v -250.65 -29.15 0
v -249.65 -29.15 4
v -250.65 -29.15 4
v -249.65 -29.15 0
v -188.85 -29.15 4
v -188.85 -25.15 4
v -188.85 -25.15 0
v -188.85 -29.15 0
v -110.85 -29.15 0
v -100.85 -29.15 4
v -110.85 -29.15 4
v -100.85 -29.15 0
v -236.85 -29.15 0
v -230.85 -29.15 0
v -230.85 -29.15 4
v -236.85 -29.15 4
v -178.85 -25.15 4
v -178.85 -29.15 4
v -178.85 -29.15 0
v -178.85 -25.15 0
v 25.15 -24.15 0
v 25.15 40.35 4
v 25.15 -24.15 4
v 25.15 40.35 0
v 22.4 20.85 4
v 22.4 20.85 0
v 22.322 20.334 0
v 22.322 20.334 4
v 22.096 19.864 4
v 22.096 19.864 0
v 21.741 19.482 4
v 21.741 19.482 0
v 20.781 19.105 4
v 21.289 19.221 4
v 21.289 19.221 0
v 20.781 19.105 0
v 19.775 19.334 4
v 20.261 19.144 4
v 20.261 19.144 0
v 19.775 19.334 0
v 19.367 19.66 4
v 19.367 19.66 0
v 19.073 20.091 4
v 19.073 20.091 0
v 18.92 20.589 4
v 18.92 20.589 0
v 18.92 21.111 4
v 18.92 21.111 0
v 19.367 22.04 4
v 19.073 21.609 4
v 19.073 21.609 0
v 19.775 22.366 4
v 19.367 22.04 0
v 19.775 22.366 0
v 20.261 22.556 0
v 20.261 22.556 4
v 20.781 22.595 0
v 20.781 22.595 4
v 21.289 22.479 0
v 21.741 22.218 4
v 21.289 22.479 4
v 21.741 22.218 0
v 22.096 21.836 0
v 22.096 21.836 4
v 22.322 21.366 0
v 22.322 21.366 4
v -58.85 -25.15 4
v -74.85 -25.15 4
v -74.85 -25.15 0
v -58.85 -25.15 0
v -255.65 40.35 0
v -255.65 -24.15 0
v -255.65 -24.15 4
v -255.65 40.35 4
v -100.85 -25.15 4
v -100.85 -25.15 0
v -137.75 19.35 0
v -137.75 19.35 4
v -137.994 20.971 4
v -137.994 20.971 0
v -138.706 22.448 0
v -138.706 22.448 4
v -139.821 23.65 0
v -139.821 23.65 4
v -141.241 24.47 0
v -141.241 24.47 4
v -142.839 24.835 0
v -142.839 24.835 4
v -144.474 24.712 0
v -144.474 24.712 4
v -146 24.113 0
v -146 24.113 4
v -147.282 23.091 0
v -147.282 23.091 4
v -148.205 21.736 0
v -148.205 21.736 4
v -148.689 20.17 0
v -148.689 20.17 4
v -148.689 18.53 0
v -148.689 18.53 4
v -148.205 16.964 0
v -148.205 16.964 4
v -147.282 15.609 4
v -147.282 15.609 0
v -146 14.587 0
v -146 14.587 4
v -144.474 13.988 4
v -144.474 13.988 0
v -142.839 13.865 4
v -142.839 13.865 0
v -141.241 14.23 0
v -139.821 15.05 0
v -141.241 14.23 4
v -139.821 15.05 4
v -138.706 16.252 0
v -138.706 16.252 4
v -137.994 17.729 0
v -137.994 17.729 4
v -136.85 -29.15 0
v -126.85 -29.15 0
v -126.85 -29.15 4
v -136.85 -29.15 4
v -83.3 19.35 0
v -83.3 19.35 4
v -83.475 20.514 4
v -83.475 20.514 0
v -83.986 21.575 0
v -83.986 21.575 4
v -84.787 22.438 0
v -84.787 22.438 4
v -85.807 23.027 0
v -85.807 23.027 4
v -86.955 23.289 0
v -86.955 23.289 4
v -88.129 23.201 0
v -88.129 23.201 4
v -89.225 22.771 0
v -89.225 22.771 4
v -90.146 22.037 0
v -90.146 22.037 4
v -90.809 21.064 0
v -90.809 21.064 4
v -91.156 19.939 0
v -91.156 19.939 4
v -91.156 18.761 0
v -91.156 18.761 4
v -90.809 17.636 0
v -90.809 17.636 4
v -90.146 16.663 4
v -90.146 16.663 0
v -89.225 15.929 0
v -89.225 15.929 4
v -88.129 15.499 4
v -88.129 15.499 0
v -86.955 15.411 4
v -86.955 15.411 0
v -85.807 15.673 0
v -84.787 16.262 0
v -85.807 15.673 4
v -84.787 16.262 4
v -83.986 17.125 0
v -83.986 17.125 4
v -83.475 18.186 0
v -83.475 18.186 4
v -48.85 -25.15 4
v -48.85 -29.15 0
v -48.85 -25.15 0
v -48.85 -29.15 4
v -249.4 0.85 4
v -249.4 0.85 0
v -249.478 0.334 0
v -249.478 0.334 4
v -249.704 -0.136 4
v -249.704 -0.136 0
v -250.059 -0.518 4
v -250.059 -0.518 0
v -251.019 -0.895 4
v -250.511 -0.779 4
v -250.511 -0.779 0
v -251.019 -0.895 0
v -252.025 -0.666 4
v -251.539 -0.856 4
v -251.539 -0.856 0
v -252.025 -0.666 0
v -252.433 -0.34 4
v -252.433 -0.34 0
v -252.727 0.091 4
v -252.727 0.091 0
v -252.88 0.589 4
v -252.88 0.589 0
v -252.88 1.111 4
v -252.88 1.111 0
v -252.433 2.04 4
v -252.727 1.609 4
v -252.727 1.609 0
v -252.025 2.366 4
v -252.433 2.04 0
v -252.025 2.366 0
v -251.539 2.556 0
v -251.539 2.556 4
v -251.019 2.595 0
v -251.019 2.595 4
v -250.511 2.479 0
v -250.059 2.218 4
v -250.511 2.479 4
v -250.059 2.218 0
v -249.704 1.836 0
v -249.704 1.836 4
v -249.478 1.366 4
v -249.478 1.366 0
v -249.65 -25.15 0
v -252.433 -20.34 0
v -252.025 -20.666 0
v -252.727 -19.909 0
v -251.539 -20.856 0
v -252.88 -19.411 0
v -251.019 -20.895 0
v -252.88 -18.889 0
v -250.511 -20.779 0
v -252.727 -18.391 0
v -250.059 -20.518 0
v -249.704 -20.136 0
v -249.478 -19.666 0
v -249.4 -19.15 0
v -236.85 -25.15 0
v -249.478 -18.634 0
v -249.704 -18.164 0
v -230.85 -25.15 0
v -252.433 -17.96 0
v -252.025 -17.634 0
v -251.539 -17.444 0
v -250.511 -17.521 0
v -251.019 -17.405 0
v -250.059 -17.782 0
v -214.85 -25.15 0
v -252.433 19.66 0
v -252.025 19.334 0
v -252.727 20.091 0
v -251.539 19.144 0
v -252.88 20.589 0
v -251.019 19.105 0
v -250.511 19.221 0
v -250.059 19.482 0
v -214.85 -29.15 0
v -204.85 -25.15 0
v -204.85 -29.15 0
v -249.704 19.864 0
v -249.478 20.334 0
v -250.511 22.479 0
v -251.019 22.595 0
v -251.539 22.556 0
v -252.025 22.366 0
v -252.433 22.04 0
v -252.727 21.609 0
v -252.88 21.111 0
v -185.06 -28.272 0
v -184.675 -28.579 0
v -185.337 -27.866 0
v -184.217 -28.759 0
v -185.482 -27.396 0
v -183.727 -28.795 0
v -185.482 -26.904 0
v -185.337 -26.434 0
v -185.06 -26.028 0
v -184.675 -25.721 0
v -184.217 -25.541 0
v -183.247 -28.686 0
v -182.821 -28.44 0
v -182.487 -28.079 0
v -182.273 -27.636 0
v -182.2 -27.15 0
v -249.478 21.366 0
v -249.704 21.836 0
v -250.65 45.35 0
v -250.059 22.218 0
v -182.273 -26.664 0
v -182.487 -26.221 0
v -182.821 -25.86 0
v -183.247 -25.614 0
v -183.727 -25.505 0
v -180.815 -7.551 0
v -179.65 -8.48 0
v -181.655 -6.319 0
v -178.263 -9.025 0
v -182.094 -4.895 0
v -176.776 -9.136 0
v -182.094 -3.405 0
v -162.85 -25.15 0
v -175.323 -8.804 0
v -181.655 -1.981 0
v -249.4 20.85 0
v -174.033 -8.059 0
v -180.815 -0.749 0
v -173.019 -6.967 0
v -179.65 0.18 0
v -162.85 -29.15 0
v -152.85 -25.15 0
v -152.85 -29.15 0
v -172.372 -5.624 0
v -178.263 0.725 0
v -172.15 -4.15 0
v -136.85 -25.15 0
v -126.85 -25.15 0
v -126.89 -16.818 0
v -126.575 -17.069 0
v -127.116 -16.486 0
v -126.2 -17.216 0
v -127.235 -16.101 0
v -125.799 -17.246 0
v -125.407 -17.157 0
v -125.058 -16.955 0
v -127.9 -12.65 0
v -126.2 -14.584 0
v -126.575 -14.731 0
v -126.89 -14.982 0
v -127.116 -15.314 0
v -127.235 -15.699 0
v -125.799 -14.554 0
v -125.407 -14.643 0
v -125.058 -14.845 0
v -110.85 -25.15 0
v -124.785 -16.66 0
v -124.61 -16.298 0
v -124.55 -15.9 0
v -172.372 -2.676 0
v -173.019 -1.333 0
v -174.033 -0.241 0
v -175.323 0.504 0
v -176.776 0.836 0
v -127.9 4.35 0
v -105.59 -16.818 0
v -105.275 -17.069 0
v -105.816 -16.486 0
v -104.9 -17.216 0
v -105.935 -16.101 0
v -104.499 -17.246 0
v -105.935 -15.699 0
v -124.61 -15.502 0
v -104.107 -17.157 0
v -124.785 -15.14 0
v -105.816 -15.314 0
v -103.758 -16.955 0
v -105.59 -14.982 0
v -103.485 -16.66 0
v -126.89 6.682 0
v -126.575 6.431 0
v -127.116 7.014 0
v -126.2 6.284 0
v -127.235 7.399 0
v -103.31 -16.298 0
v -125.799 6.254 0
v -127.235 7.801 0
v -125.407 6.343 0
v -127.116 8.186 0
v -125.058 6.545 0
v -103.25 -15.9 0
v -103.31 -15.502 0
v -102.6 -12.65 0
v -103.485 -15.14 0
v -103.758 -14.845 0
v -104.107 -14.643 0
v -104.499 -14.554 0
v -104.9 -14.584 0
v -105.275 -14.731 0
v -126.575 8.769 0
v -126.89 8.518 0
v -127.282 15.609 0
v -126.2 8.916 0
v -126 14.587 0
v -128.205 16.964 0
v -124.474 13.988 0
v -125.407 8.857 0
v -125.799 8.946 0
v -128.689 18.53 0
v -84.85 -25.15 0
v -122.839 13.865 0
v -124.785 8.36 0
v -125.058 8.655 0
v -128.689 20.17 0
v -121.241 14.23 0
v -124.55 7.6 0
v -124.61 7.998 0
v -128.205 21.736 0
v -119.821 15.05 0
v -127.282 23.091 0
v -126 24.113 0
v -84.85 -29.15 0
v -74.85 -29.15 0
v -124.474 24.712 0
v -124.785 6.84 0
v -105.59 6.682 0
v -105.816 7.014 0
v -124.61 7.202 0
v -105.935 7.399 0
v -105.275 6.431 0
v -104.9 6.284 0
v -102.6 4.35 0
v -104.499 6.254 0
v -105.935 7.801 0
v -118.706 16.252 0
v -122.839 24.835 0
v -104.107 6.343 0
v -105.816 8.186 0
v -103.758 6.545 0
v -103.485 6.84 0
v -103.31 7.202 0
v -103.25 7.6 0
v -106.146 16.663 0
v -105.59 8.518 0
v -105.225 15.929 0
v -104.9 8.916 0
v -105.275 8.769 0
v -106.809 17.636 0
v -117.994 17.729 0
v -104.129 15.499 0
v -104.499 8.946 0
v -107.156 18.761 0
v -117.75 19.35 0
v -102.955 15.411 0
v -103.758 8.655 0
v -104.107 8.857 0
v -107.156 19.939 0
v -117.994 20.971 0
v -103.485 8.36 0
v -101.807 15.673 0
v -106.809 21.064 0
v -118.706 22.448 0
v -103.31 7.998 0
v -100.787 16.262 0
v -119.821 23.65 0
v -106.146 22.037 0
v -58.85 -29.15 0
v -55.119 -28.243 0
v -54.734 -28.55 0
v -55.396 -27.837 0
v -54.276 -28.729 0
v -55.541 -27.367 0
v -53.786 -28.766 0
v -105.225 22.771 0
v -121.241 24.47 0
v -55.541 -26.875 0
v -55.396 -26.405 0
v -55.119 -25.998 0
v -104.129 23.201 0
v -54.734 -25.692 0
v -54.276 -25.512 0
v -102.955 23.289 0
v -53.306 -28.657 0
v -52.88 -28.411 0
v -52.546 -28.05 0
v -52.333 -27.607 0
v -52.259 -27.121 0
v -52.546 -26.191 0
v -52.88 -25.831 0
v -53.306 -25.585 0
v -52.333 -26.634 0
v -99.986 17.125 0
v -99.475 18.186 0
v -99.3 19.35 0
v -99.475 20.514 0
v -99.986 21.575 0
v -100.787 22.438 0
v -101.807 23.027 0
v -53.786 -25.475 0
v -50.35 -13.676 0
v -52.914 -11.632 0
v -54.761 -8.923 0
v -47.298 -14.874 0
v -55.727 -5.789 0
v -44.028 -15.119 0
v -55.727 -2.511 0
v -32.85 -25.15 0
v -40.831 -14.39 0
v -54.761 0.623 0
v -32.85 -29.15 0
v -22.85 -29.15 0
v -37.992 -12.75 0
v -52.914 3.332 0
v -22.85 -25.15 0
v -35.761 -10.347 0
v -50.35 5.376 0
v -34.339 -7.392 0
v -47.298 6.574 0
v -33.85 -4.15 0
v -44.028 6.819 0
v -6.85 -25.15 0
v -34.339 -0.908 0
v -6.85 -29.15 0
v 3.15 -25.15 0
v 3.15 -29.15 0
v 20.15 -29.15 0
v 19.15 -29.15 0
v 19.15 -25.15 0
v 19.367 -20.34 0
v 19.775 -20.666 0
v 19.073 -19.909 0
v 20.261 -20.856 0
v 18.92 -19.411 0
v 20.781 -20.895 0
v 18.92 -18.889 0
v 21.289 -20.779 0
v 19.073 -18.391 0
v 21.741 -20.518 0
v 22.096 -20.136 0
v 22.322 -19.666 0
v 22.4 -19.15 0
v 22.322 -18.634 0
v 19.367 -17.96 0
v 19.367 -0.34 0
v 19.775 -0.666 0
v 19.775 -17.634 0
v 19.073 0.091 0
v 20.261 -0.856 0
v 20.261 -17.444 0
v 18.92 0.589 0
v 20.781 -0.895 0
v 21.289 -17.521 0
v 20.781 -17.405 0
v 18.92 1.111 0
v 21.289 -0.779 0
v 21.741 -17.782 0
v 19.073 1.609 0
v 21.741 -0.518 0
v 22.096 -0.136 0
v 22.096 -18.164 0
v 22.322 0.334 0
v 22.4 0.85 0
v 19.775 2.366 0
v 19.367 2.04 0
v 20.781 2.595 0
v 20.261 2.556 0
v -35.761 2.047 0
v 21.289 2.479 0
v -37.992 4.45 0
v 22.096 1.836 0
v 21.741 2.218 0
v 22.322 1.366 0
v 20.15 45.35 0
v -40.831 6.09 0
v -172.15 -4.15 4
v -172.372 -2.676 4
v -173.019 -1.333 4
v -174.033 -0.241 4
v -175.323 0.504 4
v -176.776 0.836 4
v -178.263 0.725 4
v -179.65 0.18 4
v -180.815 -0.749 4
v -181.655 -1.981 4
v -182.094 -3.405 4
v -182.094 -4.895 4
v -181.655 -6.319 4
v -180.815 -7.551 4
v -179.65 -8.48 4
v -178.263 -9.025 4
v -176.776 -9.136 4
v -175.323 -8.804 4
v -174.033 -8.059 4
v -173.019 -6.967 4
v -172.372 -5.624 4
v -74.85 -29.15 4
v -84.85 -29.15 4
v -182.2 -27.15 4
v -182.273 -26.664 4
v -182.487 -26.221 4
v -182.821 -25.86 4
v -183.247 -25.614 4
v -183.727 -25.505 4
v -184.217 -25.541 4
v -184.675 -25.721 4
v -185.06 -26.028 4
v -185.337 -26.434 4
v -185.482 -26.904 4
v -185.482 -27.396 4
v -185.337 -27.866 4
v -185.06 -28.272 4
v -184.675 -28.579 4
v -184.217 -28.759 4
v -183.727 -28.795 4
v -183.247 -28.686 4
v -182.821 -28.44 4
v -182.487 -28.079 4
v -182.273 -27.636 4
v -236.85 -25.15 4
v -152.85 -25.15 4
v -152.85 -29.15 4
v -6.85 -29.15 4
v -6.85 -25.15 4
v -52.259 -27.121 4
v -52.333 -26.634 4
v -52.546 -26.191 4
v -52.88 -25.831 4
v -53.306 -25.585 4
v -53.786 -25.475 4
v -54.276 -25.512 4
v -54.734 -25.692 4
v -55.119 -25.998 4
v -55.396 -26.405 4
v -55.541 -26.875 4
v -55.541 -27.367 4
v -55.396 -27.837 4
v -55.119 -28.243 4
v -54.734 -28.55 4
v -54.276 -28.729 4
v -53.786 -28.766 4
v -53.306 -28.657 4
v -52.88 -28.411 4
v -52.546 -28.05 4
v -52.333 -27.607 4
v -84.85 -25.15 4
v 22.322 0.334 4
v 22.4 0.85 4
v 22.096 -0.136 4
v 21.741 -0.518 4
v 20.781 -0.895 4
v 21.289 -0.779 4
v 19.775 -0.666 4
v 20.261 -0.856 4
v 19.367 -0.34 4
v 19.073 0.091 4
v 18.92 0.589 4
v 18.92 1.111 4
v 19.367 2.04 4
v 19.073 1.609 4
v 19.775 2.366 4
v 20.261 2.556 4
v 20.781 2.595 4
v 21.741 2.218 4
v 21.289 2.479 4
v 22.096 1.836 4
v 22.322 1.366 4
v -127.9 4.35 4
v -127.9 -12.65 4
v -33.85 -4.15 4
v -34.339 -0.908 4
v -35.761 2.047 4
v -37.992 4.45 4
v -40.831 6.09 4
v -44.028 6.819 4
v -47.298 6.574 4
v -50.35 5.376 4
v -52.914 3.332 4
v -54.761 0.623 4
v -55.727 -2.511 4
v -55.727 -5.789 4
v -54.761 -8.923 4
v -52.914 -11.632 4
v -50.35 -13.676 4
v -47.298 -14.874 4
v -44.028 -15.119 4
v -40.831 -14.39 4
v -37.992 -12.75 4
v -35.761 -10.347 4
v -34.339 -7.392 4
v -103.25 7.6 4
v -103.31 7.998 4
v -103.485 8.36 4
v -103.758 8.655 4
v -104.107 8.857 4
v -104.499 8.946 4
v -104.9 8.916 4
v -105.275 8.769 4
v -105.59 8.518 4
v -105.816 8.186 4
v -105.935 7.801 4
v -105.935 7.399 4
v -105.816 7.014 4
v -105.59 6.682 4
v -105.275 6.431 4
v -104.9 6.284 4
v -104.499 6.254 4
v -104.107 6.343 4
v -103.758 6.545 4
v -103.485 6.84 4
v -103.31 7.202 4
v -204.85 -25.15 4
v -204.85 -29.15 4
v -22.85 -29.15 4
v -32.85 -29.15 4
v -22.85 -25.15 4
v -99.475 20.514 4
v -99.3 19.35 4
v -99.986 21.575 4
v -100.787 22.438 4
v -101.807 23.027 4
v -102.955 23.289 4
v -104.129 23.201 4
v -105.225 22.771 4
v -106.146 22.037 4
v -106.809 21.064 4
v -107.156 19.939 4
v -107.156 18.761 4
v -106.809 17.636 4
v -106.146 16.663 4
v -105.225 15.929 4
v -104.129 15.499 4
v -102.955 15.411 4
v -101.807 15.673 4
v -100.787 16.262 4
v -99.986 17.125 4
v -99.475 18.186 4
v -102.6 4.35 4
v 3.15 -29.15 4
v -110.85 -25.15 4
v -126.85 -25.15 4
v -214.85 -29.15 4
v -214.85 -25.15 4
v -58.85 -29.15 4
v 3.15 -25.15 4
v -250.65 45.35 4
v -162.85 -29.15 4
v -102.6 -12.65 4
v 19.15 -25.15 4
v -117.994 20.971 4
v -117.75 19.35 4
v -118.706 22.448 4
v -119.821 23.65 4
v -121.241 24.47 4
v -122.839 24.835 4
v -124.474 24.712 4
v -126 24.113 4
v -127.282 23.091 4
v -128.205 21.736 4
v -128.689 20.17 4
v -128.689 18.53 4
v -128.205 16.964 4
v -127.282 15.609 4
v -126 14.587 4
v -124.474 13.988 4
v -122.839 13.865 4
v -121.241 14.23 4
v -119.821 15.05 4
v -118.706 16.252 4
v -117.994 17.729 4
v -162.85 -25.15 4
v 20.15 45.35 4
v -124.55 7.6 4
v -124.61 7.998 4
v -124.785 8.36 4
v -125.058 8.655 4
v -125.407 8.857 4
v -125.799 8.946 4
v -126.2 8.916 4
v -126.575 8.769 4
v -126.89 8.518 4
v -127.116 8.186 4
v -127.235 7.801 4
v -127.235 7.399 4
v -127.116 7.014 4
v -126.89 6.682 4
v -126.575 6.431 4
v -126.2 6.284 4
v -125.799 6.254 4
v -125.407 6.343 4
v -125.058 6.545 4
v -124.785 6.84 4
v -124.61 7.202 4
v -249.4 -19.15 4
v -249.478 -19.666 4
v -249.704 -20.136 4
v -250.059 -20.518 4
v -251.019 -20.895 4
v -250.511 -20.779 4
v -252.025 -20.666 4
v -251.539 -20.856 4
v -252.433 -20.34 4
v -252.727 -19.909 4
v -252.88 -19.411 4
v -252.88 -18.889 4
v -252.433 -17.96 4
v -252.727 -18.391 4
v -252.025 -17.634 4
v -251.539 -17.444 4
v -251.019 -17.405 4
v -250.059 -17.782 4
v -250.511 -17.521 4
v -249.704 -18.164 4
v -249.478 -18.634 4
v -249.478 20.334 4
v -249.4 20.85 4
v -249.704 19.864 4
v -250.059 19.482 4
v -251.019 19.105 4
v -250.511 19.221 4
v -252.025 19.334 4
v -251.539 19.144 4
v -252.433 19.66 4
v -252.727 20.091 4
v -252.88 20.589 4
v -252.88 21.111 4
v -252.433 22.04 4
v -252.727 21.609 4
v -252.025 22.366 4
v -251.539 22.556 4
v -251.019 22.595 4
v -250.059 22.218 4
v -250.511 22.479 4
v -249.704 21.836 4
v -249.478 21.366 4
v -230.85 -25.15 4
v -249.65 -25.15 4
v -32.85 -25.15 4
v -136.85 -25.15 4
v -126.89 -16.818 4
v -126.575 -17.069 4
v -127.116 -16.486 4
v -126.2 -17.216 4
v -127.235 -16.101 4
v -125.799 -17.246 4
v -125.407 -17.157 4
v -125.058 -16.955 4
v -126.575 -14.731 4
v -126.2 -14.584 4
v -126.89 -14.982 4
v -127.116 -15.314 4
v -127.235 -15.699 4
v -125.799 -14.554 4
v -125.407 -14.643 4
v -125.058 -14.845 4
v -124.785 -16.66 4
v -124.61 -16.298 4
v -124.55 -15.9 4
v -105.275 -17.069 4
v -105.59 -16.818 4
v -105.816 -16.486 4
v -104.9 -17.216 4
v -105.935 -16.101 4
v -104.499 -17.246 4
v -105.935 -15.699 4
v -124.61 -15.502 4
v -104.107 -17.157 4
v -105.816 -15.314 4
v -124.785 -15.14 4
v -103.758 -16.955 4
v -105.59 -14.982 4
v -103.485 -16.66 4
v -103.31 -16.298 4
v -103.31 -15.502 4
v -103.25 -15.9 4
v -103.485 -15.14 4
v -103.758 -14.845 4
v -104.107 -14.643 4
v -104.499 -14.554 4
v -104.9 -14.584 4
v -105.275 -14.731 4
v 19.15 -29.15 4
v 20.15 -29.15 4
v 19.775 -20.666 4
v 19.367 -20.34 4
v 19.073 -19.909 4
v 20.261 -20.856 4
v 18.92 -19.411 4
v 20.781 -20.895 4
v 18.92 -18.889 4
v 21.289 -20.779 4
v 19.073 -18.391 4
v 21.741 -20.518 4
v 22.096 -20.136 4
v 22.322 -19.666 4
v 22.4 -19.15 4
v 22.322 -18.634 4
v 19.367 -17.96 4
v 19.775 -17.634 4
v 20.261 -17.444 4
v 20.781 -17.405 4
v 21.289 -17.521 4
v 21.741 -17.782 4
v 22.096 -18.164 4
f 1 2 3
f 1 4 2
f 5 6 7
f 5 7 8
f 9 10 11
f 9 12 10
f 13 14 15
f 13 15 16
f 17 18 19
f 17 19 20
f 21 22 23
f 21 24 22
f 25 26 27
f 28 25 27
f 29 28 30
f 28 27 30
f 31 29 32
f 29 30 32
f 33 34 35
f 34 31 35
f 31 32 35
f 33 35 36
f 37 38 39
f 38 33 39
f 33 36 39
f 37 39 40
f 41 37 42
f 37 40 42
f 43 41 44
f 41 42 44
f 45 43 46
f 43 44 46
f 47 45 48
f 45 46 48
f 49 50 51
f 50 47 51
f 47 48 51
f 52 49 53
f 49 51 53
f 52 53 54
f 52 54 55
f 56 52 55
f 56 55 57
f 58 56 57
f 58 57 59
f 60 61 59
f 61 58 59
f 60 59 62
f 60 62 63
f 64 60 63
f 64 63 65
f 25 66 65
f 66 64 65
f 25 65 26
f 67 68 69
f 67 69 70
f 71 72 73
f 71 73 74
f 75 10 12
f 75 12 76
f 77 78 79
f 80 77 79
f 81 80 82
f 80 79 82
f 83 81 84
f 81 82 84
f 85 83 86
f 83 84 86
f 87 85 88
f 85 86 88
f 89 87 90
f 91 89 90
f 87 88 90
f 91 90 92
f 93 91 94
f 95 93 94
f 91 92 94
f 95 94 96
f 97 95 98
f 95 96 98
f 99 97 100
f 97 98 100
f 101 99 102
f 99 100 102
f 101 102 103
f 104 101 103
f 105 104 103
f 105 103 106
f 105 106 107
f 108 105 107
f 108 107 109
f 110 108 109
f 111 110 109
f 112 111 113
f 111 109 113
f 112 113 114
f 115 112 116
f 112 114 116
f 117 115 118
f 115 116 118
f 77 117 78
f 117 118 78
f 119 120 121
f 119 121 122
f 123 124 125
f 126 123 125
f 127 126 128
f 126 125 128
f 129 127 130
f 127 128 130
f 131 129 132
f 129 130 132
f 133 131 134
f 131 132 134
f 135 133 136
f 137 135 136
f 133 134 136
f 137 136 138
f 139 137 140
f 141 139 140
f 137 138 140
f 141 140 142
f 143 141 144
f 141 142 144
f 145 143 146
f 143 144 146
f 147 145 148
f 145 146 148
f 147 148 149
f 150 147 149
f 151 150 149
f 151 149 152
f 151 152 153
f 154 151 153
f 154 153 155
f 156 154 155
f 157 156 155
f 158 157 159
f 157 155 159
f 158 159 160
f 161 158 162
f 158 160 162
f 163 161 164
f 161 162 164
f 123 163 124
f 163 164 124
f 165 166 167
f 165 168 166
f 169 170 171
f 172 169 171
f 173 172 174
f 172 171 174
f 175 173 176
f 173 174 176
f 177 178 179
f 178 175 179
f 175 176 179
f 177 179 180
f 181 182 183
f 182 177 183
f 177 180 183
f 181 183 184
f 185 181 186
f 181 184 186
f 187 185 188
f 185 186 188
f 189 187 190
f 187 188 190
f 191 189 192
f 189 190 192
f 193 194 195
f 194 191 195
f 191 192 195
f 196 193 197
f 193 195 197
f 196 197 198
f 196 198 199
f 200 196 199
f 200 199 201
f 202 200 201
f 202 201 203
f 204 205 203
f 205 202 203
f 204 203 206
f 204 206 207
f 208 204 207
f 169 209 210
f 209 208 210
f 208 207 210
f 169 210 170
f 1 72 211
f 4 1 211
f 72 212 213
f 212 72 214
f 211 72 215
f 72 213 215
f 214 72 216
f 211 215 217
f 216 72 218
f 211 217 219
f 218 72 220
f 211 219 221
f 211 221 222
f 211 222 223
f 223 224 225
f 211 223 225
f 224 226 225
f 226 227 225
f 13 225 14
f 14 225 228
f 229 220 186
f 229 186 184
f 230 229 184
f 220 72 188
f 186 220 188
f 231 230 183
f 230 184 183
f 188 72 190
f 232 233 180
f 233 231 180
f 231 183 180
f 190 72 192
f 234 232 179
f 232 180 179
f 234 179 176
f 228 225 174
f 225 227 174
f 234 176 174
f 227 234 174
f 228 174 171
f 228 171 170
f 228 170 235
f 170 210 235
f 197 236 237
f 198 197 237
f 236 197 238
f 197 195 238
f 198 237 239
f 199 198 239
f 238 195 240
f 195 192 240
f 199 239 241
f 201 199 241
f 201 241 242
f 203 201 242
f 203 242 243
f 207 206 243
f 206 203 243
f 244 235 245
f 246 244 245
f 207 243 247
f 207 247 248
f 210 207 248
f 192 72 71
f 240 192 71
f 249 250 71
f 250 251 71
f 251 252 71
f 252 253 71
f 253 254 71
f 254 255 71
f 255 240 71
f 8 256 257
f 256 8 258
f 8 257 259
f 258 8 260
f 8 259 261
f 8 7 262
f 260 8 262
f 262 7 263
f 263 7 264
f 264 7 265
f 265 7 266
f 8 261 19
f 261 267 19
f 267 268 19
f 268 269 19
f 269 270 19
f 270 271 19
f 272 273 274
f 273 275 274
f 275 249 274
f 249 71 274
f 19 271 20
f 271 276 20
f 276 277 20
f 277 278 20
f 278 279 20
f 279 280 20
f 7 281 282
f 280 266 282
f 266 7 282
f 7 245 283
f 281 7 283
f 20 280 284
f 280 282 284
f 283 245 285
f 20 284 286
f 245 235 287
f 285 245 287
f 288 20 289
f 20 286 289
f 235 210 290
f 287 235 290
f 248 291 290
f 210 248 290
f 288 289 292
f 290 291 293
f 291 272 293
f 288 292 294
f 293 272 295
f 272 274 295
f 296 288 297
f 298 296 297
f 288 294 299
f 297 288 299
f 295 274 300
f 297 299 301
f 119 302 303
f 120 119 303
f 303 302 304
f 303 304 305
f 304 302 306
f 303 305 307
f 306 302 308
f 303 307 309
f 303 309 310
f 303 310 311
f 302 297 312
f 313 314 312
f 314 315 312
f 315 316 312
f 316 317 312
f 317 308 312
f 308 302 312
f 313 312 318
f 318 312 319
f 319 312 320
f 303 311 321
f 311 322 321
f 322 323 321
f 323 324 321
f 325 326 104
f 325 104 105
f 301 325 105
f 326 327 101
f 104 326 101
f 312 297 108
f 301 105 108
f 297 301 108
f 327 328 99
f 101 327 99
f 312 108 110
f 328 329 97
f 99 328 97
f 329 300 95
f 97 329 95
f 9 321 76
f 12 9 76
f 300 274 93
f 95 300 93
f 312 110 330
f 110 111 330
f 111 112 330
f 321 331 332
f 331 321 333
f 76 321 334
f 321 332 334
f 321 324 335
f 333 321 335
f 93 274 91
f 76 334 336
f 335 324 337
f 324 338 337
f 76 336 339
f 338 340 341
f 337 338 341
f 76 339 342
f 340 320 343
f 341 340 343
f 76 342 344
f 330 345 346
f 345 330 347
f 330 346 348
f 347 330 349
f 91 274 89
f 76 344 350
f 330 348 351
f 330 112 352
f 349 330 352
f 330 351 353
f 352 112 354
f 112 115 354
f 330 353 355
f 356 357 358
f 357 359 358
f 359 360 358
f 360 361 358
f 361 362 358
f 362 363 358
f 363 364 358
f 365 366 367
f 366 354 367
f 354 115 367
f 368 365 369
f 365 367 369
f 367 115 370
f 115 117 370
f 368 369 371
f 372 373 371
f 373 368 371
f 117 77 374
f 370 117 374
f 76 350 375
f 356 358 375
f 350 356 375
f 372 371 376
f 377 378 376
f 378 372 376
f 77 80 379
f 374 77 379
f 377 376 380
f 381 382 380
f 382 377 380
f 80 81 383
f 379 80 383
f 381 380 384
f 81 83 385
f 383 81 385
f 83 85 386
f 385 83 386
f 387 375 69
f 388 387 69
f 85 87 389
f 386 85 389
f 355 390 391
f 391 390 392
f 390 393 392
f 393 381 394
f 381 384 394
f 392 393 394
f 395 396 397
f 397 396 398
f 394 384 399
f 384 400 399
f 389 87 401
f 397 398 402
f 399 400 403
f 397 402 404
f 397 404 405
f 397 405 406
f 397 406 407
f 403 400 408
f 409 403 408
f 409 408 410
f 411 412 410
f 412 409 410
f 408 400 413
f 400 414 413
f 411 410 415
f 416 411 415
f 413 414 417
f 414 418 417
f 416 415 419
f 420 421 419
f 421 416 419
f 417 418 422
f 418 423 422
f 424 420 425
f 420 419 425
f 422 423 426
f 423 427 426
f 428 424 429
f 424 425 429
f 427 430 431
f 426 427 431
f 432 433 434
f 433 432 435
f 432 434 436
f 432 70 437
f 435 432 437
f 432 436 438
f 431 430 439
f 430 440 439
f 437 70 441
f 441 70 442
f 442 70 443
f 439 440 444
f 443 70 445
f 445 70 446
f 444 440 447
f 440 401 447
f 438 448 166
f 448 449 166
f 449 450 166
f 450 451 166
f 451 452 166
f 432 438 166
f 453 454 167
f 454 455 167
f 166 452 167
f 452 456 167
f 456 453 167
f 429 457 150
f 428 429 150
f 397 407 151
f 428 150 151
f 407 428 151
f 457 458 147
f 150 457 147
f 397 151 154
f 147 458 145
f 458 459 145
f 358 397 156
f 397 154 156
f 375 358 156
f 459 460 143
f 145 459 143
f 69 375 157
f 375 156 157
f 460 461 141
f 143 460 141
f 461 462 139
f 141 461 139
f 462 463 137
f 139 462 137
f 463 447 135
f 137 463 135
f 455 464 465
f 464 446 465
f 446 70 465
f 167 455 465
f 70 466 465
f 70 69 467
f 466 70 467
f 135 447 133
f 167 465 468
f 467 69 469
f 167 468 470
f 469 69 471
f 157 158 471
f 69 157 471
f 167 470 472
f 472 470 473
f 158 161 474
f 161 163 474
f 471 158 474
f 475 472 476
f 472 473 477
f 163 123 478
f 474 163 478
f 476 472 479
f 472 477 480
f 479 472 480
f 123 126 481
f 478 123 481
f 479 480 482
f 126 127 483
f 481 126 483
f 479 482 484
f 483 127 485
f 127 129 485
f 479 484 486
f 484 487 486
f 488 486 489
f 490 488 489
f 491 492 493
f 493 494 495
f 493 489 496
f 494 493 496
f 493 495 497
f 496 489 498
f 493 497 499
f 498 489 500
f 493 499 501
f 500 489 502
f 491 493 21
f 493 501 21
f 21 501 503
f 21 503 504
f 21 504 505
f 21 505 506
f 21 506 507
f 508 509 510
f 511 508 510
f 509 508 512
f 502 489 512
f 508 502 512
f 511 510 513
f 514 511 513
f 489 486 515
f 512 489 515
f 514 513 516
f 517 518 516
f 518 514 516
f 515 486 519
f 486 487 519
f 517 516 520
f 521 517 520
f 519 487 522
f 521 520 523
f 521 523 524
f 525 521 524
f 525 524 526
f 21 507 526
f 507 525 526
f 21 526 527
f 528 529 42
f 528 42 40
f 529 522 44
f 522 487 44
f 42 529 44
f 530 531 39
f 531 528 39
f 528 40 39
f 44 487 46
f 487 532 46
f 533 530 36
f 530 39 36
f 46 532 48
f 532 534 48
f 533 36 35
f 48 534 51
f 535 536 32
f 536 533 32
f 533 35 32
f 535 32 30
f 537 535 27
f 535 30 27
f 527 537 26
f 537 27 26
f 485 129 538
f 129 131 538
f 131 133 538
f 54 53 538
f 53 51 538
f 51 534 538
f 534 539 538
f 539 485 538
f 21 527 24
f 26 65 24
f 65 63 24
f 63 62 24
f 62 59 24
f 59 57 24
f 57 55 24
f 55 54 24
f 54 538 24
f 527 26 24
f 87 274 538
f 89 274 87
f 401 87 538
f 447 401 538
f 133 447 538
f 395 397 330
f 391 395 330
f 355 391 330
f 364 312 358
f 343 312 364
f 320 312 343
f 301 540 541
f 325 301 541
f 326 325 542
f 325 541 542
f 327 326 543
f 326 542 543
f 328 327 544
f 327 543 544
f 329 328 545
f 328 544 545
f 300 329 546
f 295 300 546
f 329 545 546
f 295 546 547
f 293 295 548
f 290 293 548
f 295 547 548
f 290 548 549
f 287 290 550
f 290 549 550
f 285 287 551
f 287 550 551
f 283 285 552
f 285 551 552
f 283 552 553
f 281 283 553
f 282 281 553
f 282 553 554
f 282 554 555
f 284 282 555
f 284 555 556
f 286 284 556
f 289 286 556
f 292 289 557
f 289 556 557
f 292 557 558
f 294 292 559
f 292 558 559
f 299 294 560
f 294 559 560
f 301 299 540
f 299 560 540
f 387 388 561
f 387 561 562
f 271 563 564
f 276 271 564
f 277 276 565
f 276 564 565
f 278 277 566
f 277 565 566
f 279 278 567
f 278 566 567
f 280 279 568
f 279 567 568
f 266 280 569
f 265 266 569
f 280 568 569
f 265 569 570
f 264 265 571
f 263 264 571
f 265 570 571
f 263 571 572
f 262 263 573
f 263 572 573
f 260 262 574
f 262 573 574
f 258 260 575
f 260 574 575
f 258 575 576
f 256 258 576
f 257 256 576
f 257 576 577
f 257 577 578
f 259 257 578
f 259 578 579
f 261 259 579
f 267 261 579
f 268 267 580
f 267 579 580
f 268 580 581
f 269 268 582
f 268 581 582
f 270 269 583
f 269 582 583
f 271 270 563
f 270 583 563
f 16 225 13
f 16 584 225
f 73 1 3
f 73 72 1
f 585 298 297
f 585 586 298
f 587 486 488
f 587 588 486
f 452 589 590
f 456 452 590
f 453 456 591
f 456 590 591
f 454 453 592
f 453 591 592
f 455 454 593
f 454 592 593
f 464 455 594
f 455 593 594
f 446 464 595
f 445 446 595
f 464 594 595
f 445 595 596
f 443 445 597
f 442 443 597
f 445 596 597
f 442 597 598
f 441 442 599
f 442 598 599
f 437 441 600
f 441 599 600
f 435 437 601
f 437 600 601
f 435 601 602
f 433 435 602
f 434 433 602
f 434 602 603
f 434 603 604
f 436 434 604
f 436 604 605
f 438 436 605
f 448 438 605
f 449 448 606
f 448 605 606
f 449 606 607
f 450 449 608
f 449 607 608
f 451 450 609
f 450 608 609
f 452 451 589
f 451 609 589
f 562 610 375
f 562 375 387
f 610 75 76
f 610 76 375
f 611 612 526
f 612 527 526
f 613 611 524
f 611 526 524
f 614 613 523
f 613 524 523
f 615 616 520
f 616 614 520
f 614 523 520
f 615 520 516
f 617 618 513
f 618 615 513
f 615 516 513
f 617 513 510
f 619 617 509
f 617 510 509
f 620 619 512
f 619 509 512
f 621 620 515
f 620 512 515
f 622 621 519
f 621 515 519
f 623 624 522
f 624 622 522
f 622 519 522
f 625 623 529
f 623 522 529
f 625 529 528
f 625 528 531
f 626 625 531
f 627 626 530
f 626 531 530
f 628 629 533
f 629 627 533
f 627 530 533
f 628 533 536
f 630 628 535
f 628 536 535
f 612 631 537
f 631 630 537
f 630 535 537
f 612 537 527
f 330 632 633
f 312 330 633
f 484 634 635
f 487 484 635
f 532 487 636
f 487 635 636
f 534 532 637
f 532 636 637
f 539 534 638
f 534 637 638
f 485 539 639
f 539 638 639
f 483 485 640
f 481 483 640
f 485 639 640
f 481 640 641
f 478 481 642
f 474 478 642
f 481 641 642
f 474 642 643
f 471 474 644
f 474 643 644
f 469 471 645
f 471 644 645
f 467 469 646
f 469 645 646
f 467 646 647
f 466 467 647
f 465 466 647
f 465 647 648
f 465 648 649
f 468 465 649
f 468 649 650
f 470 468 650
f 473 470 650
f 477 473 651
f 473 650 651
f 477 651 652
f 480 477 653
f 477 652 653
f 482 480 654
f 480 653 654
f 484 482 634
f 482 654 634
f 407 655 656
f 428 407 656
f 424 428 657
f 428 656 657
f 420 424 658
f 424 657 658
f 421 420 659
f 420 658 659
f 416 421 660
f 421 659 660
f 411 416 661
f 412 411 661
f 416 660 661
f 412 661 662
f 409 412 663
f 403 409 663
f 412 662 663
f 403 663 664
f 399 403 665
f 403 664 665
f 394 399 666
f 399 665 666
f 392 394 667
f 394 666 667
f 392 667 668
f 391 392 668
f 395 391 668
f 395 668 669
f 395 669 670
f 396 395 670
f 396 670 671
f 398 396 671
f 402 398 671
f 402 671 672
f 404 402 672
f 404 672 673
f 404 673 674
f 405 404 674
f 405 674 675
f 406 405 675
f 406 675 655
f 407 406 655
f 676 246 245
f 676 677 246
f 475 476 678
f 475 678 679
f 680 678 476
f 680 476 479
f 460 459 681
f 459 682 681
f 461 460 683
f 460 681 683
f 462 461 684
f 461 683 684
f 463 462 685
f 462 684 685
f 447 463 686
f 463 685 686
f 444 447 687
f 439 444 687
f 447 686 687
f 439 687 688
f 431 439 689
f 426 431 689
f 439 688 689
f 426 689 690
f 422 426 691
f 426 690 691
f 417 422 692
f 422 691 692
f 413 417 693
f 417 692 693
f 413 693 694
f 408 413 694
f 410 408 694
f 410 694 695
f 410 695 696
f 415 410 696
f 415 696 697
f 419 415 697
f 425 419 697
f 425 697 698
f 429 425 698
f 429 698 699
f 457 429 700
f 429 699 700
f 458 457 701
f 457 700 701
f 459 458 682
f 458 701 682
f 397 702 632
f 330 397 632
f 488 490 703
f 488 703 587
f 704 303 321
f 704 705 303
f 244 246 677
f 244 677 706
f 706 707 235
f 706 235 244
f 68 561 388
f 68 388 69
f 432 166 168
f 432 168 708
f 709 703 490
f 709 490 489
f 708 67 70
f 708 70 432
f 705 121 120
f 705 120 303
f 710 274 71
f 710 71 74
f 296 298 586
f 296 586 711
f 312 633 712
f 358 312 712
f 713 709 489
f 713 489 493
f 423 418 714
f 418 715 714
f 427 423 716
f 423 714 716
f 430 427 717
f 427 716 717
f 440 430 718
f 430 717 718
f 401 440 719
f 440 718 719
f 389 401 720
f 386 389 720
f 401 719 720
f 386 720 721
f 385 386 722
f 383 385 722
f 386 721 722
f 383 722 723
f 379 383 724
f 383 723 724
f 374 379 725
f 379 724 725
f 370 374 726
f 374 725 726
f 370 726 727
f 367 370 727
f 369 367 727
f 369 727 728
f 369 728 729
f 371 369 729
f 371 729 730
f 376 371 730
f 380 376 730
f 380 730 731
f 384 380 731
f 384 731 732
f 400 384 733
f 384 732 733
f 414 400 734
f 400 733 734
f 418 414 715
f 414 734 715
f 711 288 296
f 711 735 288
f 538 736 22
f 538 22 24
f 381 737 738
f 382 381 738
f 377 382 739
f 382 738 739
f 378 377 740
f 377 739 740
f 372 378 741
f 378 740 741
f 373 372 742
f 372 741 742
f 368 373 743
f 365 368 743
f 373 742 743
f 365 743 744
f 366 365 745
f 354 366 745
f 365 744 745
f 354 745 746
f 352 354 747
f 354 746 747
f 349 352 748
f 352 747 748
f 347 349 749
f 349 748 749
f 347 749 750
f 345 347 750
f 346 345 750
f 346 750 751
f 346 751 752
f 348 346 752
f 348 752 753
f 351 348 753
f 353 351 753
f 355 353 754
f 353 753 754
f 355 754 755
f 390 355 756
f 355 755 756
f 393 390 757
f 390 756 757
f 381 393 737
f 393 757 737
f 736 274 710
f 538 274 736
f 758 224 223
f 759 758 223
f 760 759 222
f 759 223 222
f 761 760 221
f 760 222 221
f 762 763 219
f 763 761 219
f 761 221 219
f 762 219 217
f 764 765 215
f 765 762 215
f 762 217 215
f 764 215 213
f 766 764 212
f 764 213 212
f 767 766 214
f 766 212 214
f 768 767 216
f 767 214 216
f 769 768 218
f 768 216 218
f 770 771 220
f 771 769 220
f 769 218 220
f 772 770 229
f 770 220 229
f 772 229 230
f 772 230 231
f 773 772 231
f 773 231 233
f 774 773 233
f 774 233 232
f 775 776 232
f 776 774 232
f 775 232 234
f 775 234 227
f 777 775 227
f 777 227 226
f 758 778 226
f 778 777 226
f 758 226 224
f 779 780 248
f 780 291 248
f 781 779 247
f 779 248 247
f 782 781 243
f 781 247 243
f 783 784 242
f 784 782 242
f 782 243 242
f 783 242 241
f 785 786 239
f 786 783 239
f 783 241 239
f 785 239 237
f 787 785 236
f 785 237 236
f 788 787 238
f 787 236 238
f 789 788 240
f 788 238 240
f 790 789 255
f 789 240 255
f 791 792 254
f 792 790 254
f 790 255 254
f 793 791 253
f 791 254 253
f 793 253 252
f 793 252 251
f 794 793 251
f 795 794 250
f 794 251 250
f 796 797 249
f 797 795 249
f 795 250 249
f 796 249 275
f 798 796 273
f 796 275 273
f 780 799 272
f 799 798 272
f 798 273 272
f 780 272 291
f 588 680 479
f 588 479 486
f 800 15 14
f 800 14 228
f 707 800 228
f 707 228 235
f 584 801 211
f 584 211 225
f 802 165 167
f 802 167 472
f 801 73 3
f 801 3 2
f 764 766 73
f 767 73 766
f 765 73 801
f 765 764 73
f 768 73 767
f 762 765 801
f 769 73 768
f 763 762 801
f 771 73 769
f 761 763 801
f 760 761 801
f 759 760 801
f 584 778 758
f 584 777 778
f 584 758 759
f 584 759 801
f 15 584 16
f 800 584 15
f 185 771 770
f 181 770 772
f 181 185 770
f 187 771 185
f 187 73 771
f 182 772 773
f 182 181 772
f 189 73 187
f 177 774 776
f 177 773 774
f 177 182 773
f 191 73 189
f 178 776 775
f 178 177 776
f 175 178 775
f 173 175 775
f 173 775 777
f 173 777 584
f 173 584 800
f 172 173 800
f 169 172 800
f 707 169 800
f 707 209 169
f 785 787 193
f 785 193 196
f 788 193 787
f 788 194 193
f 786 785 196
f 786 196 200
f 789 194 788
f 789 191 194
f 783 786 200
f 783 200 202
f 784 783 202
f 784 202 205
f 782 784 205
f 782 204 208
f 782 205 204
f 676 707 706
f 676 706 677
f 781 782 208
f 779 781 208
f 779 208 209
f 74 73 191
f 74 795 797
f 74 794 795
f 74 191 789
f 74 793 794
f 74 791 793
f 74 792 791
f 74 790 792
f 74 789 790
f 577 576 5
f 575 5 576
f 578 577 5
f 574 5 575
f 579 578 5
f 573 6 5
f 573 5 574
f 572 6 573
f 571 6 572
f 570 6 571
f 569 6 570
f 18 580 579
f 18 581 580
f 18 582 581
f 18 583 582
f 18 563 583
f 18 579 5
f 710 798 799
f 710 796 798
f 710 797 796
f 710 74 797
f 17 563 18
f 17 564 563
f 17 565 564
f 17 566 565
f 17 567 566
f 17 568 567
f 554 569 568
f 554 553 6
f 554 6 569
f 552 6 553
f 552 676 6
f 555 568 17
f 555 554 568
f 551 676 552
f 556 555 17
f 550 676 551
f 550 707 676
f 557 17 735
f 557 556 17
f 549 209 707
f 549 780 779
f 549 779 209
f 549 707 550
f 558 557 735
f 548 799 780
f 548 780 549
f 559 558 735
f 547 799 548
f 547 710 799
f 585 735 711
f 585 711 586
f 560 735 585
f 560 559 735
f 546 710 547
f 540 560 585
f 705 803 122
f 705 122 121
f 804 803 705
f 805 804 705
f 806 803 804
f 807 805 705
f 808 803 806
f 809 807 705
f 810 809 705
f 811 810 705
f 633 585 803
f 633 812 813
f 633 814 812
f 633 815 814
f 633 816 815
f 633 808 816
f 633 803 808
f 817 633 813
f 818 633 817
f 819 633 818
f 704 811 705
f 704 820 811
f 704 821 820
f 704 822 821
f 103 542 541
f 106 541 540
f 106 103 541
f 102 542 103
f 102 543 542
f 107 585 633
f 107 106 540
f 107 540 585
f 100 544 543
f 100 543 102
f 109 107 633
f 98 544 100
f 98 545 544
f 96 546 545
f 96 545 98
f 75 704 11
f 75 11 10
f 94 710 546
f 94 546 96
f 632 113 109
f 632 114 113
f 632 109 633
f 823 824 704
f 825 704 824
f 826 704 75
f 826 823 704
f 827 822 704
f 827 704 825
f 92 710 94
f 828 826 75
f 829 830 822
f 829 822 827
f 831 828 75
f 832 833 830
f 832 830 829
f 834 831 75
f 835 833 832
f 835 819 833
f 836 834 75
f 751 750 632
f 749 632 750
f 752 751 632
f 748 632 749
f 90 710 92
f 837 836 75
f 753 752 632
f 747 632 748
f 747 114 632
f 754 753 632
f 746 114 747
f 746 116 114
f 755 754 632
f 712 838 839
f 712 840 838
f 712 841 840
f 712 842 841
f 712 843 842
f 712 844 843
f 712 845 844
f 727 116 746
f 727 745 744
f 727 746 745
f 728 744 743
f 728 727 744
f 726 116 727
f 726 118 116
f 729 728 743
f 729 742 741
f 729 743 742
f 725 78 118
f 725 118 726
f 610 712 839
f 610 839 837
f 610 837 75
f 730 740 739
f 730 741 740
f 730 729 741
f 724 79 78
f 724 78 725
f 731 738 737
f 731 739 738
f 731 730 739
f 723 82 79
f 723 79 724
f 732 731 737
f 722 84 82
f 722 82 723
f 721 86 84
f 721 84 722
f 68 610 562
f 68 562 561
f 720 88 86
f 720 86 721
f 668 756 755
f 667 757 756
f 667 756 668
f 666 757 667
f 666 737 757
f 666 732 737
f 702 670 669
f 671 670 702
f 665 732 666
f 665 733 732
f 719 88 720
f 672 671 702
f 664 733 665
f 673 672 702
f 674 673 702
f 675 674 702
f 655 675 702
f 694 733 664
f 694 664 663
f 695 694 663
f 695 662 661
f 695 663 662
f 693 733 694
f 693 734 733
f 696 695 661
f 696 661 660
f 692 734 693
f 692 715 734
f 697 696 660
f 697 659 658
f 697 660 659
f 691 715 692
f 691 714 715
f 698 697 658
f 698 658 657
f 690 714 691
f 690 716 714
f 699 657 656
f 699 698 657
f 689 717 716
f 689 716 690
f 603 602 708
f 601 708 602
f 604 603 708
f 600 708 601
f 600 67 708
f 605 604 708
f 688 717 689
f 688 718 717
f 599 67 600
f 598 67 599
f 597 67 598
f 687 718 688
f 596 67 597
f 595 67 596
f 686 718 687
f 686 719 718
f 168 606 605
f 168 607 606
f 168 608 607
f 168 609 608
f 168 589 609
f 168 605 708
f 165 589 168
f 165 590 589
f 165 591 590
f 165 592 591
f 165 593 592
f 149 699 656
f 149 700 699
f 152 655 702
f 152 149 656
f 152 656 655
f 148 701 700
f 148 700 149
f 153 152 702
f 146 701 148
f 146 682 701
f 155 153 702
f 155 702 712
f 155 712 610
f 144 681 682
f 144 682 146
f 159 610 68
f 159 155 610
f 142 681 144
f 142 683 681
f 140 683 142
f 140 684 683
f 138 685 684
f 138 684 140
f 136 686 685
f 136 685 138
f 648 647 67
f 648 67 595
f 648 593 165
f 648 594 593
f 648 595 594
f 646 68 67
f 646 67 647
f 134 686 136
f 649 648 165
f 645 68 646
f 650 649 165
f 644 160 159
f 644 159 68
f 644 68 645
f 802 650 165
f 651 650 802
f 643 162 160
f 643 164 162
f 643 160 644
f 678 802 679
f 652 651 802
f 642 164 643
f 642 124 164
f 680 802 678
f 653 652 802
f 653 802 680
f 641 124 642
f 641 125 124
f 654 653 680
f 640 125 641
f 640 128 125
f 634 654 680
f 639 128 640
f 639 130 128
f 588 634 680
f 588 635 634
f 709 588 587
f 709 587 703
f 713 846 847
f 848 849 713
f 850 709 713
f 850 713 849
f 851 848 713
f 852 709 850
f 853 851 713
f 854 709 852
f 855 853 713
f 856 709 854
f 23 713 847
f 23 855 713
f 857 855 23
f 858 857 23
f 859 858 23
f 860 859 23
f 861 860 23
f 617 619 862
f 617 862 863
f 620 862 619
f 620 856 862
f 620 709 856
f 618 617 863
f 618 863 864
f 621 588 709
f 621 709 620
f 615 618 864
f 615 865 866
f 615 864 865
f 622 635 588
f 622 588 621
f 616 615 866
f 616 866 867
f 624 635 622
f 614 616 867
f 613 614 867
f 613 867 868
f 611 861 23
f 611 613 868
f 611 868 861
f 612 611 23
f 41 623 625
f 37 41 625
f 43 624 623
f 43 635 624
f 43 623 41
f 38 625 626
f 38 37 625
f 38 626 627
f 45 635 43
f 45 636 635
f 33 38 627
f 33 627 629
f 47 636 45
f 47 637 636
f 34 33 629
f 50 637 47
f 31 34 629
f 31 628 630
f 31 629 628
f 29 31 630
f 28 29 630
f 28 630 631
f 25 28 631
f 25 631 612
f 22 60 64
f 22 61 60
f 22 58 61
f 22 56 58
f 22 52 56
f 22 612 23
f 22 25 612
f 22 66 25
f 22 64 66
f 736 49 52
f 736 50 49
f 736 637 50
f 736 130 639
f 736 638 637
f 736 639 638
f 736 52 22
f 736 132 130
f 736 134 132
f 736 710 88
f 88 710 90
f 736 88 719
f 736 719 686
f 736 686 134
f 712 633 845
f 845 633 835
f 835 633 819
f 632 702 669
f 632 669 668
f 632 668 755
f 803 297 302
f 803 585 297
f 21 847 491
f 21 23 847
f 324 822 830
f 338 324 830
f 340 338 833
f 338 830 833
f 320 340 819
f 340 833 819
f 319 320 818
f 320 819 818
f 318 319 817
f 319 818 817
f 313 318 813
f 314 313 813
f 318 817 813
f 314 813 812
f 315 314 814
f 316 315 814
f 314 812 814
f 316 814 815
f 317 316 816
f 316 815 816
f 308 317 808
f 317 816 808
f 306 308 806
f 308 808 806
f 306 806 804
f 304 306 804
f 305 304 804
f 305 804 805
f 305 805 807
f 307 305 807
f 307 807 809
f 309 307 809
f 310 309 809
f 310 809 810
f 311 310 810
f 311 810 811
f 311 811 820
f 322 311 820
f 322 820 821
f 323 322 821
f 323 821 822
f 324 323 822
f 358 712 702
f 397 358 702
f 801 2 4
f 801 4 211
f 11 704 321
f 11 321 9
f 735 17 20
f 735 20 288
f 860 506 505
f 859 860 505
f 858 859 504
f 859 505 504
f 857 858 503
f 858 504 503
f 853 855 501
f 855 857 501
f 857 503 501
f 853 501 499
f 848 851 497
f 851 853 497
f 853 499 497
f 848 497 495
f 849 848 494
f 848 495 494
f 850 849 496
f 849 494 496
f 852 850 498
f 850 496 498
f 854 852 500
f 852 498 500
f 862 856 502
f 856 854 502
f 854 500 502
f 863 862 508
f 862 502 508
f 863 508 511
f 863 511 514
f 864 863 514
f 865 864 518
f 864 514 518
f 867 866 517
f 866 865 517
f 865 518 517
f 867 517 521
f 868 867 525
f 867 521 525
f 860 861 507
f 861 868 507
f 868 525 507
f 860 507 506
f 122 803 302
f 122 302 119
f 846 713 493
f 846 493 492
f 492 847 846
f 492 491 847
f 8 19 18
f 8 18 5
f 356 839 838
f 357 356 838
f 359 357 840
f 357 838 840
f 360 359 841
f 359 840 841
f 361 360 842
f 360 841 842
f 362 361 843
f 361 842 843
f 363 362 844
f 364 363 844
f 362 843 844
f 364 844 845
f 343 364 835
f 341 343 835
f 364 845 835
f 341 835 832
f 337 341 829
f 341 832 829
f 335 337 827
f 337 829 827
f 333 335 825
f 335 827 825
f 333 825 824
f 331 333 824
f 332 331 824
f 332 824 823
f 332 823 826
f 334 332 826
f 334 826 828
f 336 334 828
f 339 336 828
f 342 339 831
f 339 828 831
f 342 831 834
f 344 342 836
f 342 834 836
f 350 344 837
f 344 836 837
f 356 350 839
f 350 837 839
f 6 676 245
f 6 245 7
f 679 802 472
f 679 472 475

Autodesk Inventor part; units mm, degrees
ref_plane "YZ Plane" through (0, 0, 0) normal (1, 0, 0) x (0, 1, 0)
ref_plane "XZ Plane" through (0, 0, 0) normal (0, 1, 0) x (-1, 0, 0)
ref_plane "XY Plane" through (0, 0, 0) normal (0, 0, 1) x (1, 0, 0)
sketch "Эскиз1" plane through (0, 0, 0) normal (0, 0, 1) x (1, 0, 0)
  circle A0 centre (20.65, -19.15) radius 1.75 projected
  circle A1 centre (20.65, 0.85) radius 1.75 projected
  circle A2 centre (20.65, 20.85) radius 1.75 projected
  circle A3 centre (-251.15, -19.15) radius 1.75 projected
  circle A4 centre (-251.15, 0.85) radius 1.75 projected
  circle A5 centre (-251.15, 20.85) radius 1.75 projected
  line L0 (-255.45, -29.15) -> (-246.85, -29.15) projected
  line L1 (-255.65, -29.15) -> (-255.65, 270.85) projected
  line L2 (25.15, 270.85) -> (25.15, -29.15) projected
  line L3 (25.15, -29.15) -> (-255.65, -29.15)
  line L4 (-255.65, -29.15) -> (-255.65, 45.35)
  line L5 (-255.65, 45.35) -> (25.15, 45.35)
  line L6 (25.15, 45.35) -> (25.15, -29.15)
  point P0 (25.15, 45.35)
extrude "Выдавливание1" add sketch "Эскиз1" along normal blind 4
sketch "Эскиз4" plane through (0, 0, 4) normal (0, 0, 1) x (1, 0, 0)
  circle A0 centre (-177.15, -2.65) radius 5 construction
  line L0 (-177.15, -2.65) -> (-177.15, -29.15) construction
  line L1 (-255.65, -29.15) -> (25.15, -29.15) construction
  circle A1 centre (-177.15, -4.15) radius 5
  point P0 (0, 0)
  dimension "d30" = 10
  dimension "d31" = 25
extrude "Выдавливание4" cut sketch "Эскиз4" against normal blind 10
sketch "Эскиз5" plane through (0, 0, 4) normal (0, 0, 1) x (1, 0, 0)
  line L0 (-127.9, -12.65) -> (-102.6, -12.65)
  line L1 (-102.6, -12.65) -> (-102.6, 4.35)
  line L2 (-102.6, 4.35) -> (-127.9, 4.35)
  line L3 (-127.9, 4.35) -> (-127.9, -12.65)
  line L4 (-127.9, -12.65) -> (-102.6, 4.35) construction
  line L5 (-102.6, -12.65) -> (-127.9, 4.35) construction
  circle A0 centre (-125.9, -15.9) radius 1.35
  line L6 (-115.25, -4.15) -> (-115.25, 2.5103)
  line L7 (-115.25, -4.15) -> (-117.239, -4.15)
  circle A1 centre (-104.6, -15.9) radius 1.35
  circle A2 centre (-125.9, 7.6) radius 1.35
  circle A3 centre (-104.6, 7.6) radius 1.35
  line L8 (-255.65, -29.15) -> (25.15, -29.15) projected
  line L9 (-115.25, -29.15) -> (-115.25, -2.4897) construction
  point P0 (0, 0)
  dimension "d33" = 17
  dimension "d39" = 2.7
  dimension "d40" = 3.25
  dimension "d41" = 2
  dimension "d45" = 25.3
  dimension "d46" = 25
extrude "Выдавливание5" cut sketch "Эскиз5" against normal blind 10
sketch "Эскиз6" plane through (0, 0, 4) normal (0, 0, 1) x (1, 0, 0)
  line L0 (-127.9, -12.65) -> (-127.9, 4.35) construction
  line L1 (-101.8454, -4.15) -> (-167.9603, -4.15) construction
  circle A0 centre (-44.85, -4.15) radius 11
  line L2 (-255.65, -29.15) -> (25.15, -29.15) projected
  circle A1 centre (-87.25, 19.35) radius 3.95
  line L3 (-127.9, 4.35) -> (-102.6, 4.35) projected
  line L4 (-102.6, 4.35) -> (-102.6, -12.65) projected
  line L5 (-87.25, 19.35) -> (-143.25, 19.35) construction
  line L6 (-115.25, 4.35) -> (-115.25, 38.684) construction
  circle A2 centre (-103.25, 19.35) radius 3.95
  line L7 (25.15, -29.15) -> (25.15, 45.35) projected
  circle A3 centre (-123.25, 19.35) radius 5.5
  circle A4 centre (-143.25, 19.35) radius 5.5
  point P0 (0, 0)
  point P1 (-127.9, -4.15)
  point P2 (-115.25, 19.35)
  dimension "d54" = 22
  dimension "d59" = 25
  dimension "d61" = 7.9
  dimension "d62" = 15
  dimension "d67" = 16
  dimension "d72" = 70
  dimension "d79" = 11
  dimension "d80" = 11
  dimension "d81" = 20
  dimension "d82" = 20
extrude "Выдавливание6" cut sketch "Эскиз6" against normal blind 10
chamfer "Фаска1" distance 5 angle 45 4 edges at (25.15, 45.35, 2) (-255.65, 45.35, 2) (-255.65, -29.15, 2) (25.15, -29.15, 2)
sketch "Эскиз7" plane through (0, 0, 4) normal (0, 0, 1) x (1, 0, 0)
  line L0 (-100.85, -29.15) -> (-100.85, -25.15)
  line L1 (-100.85, -25.15) -> (-84.85, -25.15)
  line L2 (-84.85, -25.15) -> (-84.85, -29.15)
  line L3 (-84.85, -29.15) -> (-100.85, -29.15)
  line L4 (-48.85, -29.15) -> (-48.85, -25.15)
  line L5 (-48.85, -25.15) -> (-32.85, -25.15)
  line L6 (-32.85, -25.15) -> (-32.85, -29.15)
  line L7 (-32.85, -29.15) -> (-48.85, -29.15)
  line L8 (19.15, -25.15) -> (19.15, -29.15)
  line L9 (19.15, -29.15) -> (3.15, -29.15)
  line L10 (3.15, -29.15) -> (3.15, -25.15)
  line L11 (3.15, -25.15) -> (19.15, -25.15)
  line L12 (-204.85, -29.15) -> (-204.85, -25.15)
  line L13 (-204.85, -25.15) -> (-188.85, -25.15)
  line L14 (-188.85, -25.15) -> (-188.85, -29.15)
  line L15 (-188.85, -29.15) -> (-204.85, -29.15)
  line L16 (-152.85, -29.15) -> (-152.85, -25.15)
  line L17 (-152.85, -25.15) -> (-136.85, -25.15)
  line L18 (-136.85, -25.15) -> (-136.85, -29.15)
  line L19 (-136.85, -29.15) -> (-152.85, -29.15)
  line L20 (-126.85, -29.15) -> (-126.85, -25.15)
  line L21 (-126.85, -25.15) -> (-110.85, -25.15)
  line L22 (-110.85, -25.15) -> (-110.85, -29.15)
  line L23 (-110.85, -29.15) -> (-126.85, -29.15)
  line L24 (-178.85, -29.15) -> (-178.85, -25.15)
  line L25 (-178.85, -25.15) -> (-162.85, -25.15)
  line L26 (-162.85, -25.15) -> (-162.85, -29.15)
  line L27 (-162.85, -29.15) -> (-178.85, -29.15)
  line L28 (-230.85, -29.15) -> (-230.85, -25.15)
  line L29 (-230.85, -25.15) -> (-214.85, -25.15)
  line L30 (-214.85, -25.15) -> (-214.85, -29.15)
  line L31 (-214.85, -29.15) -> (-230.85, -29.15)
  line L32 (-6.85, -25.15) -> (-6.85, -29.15)
  line L33 (-6.85, -29.15) -> (-22.85, -29.15)
  line L34 (-22.85, -29.15) -> (-22.85, -25.15)
  line L35 (-22.85, -25.15) -> (-6.85, -25.15)
  line L36 (-74.85, -29.15) -> (-74.85, -25.15)
  line L37 (-74.85, -25.15) -> (-58.85, -25.15)
  line L38 (-58.85, -25.15) -> (-58.85, -29.15)
  line L39 (-58.85, -29.15) -> (-74.85, -29.15)
  line L40 (-249.65, -29.15) -> (-249.65, -25.15)
  line L41 (-249.65, -25.15) -> (-236.85, -25.15)
  line L42 (-236.85, -25.15) -> (-236.85, -29.15)
  line L43 (-236.85, -29.15) -> (-249.65, -29.15)
extrude "Выдавливание7" cut sketch "Эскиз7" against normal blind 4
sketch "Эскиз8" plane through (0, 0, 4) normal (0, 0, 1) x (1, 0, 0)
  line L0 (-32.85, -25.15) -> (-48.85, -25.15) construction
  line L1 (-48.85, -25.15) -> (-58.9685, -29.0911) construction
  circle A0 centre (-53.9092, -27.1206) radius 1.65
  line L2 (-162.85, -25.15) -> (-178.85, -25.15) construction
  line L3 (-188.85, -29.15) -> (-178.85, -29.15) construction
  line L4 (-178.85, -25.15) -> (-188.85, -29.15) construction
  circle A1 centre (-183.85, -27.15) radius 1.65
  point P0 (0, 0)
  dimension "d75" = 3.3
  dimension "d76" = 3.3
extrude "Выдавливание8" cut sketch "Эскиз8" against normal blind 4
properties part number "креп_мотора" material "Древесина (береза)"
